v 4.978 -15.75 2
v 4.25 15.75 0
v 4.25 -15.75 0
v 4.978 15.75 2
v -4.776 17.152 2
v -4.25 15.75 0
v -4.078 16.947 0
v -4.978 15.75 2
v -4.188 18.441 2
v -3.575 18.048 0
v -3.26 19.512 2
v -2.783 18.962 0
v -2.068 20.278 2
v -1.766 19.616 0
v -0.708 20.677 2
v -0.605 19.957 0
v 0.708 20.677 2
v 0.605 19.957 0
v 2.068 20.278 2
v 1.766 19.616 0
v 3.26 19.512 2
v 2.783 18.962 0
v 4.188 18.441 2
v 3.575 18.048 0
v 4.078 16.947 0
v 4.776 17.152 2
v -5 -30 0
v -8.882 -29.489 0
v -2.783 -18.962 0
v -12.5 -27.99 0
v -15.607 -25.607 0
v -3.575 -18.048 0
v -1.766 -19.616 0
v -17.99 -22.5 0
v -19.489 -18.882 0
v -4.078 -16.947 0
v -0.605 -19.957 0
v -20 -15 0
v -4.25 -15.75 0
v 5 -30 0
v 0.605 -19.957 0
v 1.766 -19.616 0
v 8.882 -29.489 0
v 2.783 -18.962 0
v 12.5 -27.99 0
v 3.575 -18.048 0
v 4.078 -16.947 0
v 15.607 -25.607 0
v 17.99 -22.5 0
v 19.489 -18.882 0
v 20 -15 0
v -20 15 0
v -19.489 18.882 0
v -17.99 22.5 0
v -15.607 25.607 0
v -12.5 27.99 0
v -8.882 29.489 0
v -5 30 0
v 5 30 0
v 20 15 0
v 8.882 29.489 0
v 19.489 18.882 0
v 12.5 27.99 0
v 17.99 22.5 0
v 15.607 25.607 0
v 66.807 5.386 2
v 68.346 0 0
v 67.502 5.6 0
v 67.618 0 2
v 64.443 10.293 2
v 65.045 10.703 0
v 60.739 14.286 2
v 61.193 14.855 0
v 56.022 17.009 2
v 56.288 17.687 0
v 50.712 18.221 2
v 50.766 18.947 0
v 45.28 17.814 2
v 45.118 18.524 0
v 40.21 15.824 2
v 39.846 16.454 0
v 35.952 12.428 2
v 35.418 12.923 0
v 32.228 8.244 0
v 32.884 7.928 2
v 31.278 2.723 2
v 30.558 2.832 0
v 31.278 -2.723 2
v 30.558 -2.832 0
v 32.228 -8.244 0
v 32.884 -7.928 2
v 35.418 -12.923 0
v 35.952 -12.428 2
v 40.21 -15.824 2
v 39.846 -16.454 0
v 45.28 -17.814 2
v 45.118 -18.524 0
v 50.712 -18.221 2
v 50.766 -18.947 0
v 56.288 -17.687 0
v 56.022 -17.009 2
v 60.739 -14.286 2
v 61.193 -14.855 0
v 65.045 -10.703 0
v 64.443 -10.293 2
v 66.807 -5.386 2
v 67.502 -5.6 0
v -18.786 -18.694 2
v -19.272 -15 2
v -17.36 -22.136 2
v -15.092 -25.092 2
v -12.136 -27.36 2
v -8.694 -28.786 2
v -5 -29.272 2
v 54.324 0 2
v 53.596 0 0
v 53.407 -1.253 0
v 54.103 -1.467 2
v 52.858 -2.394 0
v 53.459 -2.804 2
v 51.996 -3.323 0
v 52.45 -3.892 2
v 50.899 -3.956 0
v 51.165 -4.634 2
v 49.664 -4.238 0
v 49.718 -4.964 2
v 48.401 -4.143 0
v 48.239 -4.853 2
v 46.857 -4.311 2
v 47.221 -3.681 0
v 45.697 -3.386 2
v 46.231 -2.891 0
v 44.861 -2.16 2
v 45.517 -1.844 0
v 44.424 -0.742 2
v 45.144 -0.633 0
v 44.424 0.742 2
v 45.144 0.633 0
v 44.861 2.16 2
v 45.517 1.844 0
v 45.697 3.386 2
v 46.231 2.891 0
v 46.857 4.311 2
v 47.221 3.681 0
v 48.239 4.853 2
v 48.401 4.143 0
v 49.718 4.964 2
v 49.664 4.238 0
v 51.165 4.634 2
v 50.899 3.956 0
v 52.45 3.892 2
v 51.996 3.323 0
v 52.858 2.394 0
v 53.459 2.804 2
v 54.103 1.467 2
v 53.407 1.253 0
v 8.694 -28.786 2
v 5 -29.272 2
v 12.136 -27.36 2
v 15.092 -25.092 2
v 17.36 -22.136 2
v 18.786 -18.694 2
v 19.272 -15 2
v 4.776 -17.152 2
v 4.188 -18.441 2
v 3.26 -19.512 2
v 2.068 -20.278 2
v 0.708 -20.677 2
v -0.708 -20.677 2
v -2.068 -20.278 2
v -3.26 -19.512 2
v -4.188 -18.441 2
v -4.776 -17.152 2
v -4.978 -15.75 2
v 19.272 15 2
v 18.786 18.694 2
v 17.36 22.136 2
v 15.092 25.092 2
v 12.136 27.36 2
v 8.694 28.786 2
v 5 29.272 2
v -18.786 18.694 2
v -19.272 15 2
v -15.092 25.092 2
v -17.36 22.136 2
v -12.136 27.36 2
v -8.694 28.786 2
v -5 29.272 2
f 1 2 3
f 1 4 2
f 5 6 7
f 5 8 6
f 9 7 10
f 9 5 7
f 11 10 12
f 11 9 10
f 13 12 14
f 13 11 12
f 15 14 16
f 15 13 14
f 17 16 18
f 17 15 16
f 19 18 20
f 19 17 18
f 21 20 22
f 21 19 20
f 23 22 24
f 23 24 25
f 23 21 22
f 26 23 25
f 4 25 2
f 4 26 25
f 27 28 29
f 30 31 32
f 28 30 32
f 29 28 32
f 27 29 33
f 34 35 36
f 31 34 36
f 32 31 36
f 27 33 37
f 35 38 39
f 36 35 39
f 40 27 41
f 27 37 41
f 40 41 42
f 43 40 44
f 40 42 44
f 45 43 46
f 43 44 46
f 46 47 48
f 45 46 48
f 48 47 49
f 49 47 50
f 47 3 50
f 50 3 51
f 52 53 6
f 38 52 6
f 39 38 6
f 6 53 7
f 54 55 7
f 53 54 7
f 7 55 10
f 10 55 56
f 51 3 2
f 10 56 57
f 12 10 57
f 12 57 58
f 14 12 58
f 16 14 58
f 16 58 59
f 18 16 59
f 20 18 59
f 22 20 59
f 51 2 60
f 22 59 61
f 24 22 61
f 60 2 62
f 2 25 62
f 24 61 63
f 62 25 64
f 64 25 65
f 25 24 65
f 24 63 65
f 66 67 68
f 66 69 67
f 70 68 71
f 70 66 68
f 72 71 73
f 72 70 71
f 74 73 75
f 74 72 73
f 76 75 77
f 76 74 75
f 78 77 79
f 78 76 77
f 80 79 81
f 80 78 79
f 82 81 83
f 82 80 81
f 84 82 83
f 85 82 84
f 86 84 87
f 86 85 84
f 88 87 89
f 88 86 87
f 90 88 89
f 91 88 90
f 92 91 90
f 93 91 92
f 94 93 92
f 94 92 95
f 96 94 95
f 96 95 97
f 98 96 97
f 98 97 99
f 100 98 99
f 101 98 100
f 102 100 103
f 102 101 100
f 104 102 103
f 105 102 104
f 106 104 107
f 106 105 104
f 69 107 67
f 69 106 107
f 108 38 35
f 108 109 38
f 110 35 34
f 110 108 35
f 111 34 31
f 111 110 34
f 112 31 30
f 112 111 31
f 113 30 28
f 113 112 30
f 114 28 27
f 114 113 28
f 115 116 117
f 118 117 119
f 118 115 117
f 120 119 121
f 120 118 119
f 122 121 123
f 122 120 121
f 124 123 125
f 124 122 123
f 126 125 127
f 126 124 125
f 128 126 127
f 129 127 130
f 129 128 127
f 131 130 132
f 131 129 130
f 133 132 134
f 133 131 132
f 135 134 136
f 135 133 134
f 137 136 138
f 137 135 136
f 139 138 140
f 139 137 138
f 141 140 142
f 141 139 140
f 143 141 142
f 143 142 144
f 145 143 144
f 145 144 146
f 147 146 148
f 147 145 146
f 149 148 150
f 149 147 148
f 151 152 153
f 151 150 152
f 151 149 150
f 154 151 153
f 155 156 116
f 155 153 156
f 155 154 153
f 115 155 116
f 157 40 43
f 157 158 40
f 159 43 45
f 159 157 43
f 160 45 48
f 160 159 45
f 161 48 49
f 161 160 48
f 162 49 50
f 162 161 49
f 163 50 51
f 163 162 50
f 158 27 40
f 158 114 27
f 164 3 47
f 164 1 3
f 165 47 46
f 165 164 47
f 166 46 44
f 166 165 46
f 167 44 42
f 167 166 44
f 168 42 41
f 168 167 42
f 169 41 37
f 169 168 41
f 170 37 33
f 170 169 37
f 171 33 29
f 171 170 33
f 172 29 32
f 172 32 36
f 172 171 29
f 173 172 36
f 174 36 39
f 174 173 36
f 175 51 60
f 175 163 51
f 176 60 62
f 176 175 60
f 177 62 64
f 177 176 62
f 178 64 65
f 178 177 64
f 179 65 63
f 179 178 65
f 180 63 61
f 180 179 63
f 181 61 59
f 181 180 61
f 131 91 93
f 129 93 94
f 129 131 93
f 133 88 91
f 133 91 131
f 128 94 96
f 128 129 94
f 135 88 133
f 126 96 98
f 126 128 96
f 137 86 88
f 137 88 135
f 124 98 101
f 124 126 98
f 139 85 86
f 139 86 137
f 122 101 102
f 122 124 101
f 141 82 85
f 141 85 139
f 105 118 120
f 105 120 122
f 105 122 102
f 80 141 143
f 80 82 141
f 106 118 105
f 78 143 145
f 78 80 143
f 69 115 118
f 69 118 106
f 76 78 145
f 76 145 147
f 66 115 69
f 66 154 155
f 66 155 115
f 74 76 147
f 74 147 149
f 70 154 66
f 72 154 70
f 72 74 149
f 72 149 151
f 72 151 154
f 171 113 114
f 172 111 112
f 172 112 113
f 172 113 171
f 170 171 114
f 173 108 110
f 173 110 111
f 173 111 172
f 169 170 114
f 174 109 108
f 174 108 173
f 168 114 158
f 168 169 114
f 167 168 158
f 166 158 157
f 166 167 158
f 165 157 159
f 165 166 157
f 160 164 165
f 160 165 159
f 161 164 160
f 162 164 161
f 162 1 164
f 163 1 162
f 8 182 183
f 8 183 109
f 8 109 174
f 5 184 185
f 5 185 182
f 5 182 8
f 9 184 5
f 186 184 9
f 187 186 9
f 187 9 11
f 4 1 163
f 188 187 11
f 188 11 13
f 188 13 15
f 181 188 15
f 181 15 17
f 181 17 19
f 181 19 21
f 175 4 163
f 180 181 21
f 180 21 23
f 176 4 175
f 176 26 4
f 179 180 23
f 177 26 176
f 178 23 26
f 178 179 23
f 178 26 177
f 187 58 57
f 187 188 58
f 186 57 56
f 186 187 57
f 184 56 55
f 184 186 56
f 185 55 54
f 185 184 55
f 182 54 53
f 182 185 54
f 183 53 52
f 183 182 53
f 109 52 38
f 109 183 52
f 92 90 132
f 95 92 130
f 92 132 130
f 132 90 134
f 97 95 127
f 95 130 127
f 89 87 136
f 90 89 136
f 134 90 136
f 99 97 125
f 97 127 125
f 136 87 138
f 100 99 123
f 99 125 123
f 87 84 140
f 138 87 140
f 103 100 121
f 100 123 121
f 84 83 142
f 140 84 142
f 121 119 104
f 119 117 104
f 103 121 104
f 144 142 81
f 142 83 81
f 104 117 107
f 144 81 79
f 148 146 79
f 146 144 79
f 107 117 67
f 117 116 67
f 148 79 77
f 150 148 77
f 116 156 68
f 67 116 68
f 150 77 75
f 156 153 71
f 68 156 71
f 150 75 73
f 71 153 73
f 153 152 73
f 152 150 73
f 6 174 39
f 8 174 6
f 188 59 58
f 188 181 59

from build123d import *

# Parameters (mm, degrees)
F1_DEPTH = 2
F1_TAPER = 20
F0_R     = 19
F0_R_2   = 4.25
F2_DEPTH = 2
F2_TAPER = 20


with BuildPart() as f1:
    # F0 (on Top) → F1 (new body)
    with BuildSketch(Plane.XY):
        with BuildLine():
            ThreePointArc((20, 15), (15.6066017178, 25.6066017178), (5, 30))
            Line((5, 30), (-5, 30))
            ThreePointArc((-5, 30), (-15.6066017178, 25.6066017178), (-20, 15))
            Line((-20, 15), (-20, -15))
            ThreePointArc((-20, -15), (-15.6066017178, -25.6066017178), (-5, -30))
            Line((-5, -30), (5, -30))
            ThreePointArc((5, -30), (15.6066017178, -25.6066017178), (20, -15))
            Line((20, -15), (20, 15))
        make_face()
        with BuildLine():
            ThreePointArc((-4.25, 15.75), (0, 20), (4.25, 15.75))
            Line((4.25, 15.75), (4.25, -15.75))
            ThreePointArc((4.25, -15.75), (0, -20), (-4.25, -15.75))
            Line((-4.25, -15.75), (-4.25, 15.75))
        make_face(mode=Mode.SUBTRACT)
    extrude(amount=F1_DEPTH, taper=F1_TAPER)


with BuildPart() as f2:
    # F0 (on Top) → F2 (new body)
    with BuildSketch(Plane.XY):
        with Locations((49.3462421, 0)):
            Circle(F0_R)
        with Locations((49.3462421, 0)):
            Circle(F0_R_2, mode=Mode.SUBTRACT)
    extrude(amount=F2_DEPTH, taper=F2_TAPER)


solid = Compound([f1.part, f2.part])
